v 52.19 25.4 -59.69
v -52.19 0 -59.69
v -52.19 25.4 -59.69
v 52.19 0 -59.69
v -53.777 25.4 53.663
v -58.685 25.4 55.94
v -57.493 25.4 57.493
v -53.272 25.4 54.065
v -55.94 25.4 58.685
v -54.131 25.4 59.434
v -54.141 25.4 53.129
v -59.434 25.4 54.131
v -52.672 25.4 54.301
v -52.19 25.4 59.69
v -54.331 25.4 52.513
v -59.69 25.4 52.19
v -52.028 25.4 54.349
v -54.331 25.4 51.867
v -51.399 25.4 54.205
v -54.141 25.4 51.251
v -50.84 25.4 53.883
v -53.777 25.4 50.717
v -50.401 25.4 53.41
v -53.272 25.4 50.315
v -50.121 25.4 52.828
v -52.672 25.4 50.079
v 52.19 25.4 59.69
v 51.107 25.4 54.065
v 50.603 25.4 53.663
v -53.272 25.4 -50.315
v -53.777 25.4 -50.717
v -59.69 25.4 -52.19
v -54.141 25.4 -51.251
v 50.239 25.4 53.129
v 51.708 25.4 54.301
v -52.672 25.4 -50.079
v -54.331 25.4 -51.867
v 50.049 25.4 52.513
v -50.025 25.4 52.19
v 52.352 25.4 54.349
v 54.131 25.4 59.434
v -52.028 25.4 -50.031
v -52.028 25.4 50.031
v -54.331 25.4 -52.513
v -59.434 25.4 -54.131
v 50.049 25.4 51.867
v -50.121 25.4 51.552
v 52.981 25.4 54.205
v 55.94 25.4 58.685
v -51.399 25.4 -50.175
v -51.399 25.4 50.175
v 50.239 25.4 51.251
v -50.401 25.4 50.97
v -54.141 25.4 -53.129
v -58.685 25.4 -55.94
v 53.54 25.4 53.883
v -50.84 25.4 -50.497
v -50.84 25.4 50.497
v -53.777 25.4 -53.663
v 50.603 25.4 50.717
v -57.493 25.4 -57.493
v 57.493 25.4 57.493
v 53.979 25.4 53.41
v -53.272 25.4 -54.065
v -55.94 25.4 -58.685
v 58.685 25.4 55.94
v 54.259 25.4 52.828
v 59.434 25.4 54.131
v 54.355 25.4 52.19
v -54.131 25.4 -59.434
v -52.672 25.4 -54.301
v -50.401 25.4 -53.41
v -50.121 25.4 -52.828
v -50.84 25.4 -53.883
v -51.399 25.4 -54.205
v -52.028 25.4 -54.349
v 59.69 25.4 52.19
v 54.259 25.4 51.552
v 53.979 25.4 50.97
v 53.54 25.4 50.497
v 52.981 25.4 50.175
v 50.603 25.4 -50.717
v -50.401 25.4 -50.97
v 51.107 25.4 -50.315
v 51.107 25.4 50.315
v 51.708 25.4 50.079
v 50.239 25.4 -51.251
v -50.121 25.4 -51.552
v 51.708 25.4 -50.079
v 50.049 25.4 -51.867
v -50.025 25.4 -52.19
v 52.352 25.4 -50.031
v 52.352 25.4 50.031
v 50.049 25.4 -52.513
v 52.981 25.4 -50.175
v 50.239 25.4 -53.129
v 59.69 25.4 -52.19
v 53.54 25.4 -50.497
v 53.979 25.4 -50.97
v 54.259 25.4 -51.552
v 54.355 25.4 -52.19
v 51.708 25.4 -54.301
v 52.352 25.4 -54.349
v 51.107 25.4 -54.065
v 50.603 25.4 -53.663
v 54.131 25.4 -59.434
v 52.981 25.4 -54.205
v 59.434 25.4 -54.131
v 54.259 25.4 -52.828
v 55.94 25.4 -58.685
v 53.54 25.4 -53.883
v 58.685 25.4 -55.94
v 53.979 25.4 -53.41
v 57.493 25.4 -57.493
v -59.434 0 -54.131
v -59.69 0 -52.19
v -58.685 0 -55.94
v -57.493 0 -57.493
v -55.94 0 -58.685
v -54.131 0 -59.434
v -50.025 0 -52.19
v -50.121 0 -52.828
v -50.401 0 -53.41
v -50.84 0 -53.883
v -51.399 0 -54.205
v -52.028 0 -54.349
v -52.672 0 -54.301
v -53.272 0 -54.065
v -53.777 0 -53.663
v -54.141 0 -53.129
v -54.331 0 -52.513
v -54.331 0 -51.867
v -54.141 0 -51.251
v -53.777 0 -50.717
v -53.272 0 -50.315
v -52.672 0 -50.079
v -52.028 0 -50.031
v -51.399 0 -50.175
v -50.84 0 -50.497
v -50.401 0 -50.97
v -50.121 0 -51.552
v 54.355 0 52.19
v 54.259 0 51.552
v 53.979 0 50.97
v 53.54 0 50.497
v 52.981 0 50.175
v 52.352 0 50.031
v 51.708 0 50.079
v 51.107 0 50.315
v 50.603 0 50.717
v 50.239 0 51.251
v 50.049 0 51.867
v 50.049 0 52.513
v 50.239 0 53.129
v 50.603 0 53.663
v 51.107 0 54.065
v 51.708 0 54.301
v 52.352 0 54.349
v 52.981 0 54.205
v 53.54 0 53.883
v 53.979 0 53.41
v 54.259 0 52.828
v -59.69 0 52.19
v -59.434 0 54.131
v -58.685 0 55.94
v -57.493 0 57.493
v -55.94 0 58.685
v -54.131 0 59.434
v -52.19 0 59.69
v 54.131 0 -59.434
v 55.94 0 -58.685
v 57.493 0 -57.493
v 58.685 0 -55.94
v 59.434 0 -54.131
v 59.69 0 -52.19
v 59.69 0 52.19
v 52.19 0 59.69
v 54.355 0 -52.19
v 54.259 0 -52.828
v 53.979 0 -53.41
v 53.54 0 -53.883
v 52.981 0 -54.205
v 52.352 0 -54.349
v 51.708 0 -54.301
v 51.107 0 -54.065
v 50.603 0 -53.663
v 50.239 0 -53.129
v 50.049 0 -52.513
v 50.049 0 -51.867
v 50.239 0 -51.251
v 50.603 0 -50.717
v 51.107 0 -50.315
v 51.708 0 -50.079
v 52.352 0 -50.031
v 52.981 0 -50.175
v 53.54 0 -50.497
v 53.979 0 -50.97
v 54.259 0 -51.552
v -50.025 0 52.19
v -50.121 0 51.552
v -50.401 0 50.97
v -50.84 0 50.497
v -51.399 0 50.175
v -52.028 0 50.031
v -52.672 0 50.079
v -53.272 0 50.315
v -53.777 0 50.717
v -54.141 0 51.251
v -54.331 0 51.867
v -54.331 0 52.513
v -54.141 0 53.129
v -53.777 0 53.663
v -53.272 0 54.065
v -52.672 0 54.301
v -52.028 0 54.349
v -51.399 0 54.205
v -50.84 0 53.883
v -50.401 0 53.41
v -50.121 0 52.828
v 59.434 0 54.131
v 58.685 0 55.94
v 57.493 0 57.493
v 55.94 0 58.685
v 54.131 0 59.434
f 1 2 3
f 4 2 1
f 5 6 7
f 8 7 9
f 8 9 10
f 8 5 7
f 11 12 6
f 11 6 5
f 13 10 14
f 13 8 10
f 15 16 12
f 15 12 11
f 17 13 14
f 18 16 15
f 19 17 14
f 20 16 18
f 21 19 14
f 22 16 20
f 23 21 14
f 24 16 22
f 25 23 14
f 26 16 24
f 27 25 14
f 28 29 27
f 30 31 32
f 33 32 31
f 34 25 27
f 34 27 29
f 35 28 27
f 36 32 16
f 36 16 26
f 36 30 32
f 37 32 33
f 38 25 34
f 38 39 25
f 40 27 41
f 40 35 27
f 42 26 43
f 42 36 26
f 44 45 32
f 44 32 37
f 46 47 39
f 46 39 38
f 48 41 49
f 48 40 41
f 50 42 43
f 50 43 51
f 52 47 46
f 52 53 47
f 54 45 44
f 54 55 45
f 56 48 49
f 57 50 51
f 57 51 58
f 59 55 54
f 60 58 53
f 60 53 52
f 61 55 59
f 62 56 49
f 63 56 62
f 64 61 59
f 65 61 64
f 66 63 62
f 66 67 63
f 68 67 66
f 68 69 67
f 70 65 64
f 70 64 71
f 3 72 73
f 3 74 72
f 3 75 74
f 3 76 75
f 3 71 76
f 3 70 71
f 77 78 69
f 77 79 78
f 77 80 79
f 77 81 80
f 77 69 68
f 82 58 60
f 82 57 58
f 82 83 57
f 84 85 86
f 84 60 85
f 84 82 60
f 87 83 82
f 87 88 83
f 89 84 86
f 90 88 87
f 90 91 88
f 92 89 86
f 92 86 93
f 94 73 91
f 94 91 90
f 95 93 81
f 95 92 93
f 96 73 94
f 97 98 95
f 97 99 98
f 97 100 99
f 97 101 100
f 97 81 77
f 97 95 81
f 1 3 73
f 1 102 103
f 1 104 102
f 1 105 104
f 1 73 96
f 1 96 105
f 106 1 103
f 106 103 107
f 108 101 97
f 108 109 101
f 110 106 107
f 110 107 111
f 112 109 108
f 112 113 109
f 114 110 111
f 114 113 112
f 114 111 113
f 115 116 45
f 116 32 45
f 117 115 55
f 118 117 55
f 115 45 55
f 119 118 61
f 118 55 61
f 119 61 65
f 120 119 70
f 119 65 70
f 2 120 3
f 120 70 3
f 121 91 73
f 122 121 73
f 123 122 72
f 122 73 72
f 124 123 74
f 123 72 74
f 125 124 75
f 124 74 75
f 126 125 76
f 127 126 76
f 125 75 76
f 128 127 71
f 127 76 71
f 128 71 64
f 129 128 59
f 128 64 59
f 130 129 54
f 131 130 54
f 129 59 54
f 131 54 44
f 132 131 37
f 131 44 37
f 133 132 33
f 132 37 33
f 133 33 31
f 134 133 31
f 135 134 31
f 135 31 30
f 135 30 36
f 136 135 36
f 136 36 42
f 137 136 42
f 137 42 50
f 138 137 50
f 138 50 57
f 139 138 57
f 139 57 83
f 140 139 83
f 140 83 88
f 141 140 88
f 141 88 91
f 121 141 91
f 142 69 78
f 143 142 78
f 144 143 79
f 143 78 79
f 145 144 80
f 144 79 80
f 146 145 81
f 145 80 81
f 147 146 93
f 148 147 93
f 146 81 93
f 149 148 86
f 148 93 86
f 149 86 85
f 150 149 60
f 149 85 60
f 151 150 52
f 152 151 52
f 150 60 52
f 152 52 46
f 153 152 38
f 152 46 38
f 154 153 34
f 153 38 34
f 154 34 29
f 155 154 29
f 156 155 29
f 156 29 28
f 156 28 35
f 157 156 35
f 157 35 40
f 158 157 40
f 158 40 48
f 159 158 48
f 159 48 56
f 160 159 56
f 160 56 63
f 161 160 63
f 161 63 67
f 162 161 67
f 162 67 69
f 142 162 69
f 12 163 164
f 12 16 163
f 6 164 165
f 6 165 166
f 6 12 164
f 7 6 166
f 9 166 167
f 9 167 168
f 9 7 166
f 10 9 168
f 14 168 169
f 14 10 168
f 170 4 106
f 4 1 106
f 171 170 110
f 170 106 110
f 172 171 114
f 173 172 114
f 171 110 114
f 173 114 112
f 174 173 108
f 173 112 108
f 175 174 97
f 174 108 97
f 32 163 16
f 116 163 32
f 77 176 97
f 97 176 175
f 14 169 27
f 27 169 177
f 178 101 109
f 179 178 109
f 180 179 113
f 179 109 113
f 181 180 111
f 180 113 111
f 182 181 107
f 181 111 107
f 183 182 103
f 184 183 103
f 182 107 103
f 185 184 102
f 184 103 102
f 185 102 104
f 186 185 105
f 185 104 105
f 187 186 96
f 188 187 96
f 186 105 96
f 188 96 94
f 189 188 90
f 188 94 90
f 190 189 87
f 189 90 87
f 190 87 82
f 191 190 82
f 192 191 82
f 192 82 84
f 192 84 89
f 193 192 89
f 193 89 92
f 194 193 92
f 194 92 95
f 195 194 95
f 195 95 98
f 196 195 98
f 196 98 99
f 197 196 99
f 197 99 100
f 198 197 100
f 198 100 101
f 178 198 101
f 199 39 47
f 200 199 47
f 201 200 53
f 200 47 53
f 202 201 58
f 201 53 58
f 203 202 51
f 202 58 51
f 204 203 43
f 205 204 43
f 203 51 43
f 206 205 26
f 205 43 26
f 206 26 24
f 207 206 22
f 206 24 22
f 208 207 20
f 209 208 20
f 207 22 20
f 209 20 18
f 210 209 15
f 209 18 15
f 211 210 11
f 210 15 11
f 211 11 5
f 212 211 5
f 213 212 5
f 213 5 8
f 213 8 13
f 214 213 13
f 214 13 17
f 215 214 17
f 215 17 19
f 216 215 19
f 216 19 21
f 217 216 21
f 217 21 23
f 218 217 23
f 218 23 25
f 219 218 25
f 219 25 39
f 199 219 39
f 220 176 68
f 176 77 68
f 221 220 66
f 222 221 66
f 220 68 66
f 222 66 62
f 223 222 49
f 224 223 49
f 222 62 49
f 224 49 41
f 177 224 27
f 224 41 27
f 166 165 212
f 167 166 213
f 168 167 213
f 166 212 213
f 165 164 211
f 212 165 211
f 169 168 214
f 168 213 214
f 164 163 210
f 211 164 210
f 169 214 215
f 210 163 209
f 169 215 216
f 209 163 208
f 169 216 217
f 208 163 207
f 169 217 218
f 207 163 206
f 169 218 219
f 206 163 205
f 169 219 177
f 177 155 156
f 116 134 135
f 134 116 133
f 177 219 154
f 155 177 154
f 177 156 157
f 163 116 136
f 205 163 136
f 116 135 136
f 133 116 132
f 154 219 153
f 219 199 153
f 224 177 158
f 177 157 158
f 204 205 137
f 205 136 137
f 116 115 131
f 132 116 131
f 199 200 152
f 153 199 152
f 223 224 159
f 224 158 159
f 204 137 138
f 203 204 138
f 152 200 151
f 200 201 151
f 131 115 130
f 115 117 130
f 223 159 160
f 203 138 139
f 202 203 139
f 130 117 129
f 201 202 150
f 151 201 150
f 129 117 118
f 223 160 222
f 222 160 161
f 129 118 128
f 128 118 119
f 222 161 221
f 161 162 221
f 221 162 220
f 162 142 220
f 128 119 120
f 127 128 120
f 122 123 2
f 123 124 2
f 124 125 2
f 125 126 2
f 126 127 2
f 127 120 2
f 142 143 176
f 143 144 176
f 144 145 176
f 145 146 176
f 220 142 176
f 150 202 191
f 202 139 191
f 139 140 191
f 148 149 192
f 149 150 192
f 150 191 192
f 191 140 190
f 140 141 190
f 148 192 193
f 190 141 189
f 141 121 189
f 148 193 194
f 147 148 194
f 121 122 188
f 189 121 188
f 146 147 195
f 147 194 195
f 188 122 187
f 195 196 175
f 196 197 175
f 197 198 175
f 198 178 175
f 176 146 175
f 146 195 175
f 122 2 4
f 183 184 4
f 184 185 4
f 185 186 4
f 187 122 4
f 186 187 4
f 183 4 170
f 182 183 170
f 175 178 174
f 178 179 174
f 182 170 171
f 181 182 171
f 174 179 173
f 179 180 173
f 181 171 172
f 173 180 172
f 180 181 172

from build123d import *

# Parameters (mm, degrees)
SKETCH1_W           = 119.38
SKETCH1_H           = 119.38
BOSS_EXTRUDE1_DEPTH = 25.4
CUT_EXTRUDE1_REACH  = 27.4
SKETCH2_R           = 2.165
FILLET1_R           = 7.5
FILLET2_R           = 7.5
FILLET3_R           = 7.5


with BuildPart() as part:
    # Sketch1 → Boss-Extrude1 (new body)
    with BuildSketch(Plane(origin=(0, 0, 0), x_dir=(1, 0, 0), z_dir=(0, 1, 0))):
        Rectangle(SKETCH1_W, SKETCH1_H)
    extrude(amount=BOSS_EXTRUDE1_DEPTH)

    # Sketch2 → Cut-Extrude1 (cut, up to next)
    with BuildSketch(Plane(origin=(0, 25.4, 0), x_dir=(1, 0, 0), z_dir=(0, 1, 0)), mode=Mode.PRIVATE) as cut_extrude1_sk1:
        with Locations((-52.19, 52.19)):
            Circle(SKETCH2_R)
    cut_extrude1_tool1 = extrude(cut_extrude1_sk1.sketch, amount=-CUT_EXTRUDE1_REACH, mode=Mode.PRIVATE) & part.part
    add(cut_extrude1_tool1.solids().sort_by_distance((-52.19, 25.4, -52.19))[0], mode=Mode.SUBTRACT)
    # Sketch2 → Cut-Extrude1 (cut, up to next)
    with BuildSketch(Plane(origin=(0, 25.4, 0), x_dir=(1, 0, 0), z_dir=(0, 1, 0)), mode=Mode.PRIVATE) as cut_extrude1_sk2:
        with Locations((52.19, 52.19)):
            Circle(SKETCH2_R)
    cut_extrude1_tool2 = extrude(cut_extrude1_sk2.sketch, amount=-CUT_EXTRUDE1_REACH, mode=Mode.PRIVATE) & part.part
    add(cut_extrude1_tool2.solids().sort_by_distance((52.19, 25.4, -52.19))[0], mode=Mode.SUBTRACT)
    # Sketch2 → Cut-Extrude1 (cut, up to next)
    with BuildSketch(Plane(origin=(0, 25.4, 0), x_dir=(1, 0, 0), z_dir=(0, 1, 0)), mode=Mode.PRIVATE) as cut_extrude1_sk3:
        with Locations((52.19, -52.19)):
            Circle(SKETCH2_R)
    cut_extrude1_tool3 = extrude(cut_extrude1_sk3.sketch, amount=-CUT_EXTRUDE1_REACH, mode=Mode.PRIVATE) & part.part
    add(cut_extrude1_tool3.solids().sort_by_distance((52.19, 25.4, 52.19))[0], mode=Mode.SUBTRACT)
    # Sketch2 → Cut-Extrude1 (cut, up to next)
    with BuildSketch(Plane(origin=(0, 25.4, 0), x_dir=(1, 0, 0), z_dir=(0, 1, 0)), mode=Mode.PRIVATE) as cut_extrude1_sk4:
        with Locations((-52.19, -52.19)):
            Circle(SKETCH2_R)
    cut_extrude1_tool4 = extrude(cut_extrude1_sk4.sketch, amount=-CUT_EXTRUDE1_REACH, mode=Mode.PRIVATE) & part.part
    add(cut_extrude1_tool4.solids().sort_by_distance((-52.19, 25.4, 52.19))[0], mode=Mode.SUBTRACT)

    # Fillet1
    fillet1_edges = [part.edges().sort_by_distance(p)[0] for p in [
        (-59.69, 12.7, -59.69),
    ]]
    fillet(fillet1_edges, radius=FILLET1_R)

    # Fillet2
    fillet2_edges = [part.edges().sort_by_distance(p)[0] for p in [
        (59.69, 12.7, -59.69),
    ]]
    fillet(fillet2_edges, radius=FILLET2_R)

    # Fillet3
    fillet3_edges = [part.edges().sort_by_distance(p)[0] for p in [
        (59.69, 12.7, 59.69),
        (-59.69, 12.7, 59.69),
    ]]
    fillet(fillet3_edges, radius=FILLET3_R)


solid = part.part
